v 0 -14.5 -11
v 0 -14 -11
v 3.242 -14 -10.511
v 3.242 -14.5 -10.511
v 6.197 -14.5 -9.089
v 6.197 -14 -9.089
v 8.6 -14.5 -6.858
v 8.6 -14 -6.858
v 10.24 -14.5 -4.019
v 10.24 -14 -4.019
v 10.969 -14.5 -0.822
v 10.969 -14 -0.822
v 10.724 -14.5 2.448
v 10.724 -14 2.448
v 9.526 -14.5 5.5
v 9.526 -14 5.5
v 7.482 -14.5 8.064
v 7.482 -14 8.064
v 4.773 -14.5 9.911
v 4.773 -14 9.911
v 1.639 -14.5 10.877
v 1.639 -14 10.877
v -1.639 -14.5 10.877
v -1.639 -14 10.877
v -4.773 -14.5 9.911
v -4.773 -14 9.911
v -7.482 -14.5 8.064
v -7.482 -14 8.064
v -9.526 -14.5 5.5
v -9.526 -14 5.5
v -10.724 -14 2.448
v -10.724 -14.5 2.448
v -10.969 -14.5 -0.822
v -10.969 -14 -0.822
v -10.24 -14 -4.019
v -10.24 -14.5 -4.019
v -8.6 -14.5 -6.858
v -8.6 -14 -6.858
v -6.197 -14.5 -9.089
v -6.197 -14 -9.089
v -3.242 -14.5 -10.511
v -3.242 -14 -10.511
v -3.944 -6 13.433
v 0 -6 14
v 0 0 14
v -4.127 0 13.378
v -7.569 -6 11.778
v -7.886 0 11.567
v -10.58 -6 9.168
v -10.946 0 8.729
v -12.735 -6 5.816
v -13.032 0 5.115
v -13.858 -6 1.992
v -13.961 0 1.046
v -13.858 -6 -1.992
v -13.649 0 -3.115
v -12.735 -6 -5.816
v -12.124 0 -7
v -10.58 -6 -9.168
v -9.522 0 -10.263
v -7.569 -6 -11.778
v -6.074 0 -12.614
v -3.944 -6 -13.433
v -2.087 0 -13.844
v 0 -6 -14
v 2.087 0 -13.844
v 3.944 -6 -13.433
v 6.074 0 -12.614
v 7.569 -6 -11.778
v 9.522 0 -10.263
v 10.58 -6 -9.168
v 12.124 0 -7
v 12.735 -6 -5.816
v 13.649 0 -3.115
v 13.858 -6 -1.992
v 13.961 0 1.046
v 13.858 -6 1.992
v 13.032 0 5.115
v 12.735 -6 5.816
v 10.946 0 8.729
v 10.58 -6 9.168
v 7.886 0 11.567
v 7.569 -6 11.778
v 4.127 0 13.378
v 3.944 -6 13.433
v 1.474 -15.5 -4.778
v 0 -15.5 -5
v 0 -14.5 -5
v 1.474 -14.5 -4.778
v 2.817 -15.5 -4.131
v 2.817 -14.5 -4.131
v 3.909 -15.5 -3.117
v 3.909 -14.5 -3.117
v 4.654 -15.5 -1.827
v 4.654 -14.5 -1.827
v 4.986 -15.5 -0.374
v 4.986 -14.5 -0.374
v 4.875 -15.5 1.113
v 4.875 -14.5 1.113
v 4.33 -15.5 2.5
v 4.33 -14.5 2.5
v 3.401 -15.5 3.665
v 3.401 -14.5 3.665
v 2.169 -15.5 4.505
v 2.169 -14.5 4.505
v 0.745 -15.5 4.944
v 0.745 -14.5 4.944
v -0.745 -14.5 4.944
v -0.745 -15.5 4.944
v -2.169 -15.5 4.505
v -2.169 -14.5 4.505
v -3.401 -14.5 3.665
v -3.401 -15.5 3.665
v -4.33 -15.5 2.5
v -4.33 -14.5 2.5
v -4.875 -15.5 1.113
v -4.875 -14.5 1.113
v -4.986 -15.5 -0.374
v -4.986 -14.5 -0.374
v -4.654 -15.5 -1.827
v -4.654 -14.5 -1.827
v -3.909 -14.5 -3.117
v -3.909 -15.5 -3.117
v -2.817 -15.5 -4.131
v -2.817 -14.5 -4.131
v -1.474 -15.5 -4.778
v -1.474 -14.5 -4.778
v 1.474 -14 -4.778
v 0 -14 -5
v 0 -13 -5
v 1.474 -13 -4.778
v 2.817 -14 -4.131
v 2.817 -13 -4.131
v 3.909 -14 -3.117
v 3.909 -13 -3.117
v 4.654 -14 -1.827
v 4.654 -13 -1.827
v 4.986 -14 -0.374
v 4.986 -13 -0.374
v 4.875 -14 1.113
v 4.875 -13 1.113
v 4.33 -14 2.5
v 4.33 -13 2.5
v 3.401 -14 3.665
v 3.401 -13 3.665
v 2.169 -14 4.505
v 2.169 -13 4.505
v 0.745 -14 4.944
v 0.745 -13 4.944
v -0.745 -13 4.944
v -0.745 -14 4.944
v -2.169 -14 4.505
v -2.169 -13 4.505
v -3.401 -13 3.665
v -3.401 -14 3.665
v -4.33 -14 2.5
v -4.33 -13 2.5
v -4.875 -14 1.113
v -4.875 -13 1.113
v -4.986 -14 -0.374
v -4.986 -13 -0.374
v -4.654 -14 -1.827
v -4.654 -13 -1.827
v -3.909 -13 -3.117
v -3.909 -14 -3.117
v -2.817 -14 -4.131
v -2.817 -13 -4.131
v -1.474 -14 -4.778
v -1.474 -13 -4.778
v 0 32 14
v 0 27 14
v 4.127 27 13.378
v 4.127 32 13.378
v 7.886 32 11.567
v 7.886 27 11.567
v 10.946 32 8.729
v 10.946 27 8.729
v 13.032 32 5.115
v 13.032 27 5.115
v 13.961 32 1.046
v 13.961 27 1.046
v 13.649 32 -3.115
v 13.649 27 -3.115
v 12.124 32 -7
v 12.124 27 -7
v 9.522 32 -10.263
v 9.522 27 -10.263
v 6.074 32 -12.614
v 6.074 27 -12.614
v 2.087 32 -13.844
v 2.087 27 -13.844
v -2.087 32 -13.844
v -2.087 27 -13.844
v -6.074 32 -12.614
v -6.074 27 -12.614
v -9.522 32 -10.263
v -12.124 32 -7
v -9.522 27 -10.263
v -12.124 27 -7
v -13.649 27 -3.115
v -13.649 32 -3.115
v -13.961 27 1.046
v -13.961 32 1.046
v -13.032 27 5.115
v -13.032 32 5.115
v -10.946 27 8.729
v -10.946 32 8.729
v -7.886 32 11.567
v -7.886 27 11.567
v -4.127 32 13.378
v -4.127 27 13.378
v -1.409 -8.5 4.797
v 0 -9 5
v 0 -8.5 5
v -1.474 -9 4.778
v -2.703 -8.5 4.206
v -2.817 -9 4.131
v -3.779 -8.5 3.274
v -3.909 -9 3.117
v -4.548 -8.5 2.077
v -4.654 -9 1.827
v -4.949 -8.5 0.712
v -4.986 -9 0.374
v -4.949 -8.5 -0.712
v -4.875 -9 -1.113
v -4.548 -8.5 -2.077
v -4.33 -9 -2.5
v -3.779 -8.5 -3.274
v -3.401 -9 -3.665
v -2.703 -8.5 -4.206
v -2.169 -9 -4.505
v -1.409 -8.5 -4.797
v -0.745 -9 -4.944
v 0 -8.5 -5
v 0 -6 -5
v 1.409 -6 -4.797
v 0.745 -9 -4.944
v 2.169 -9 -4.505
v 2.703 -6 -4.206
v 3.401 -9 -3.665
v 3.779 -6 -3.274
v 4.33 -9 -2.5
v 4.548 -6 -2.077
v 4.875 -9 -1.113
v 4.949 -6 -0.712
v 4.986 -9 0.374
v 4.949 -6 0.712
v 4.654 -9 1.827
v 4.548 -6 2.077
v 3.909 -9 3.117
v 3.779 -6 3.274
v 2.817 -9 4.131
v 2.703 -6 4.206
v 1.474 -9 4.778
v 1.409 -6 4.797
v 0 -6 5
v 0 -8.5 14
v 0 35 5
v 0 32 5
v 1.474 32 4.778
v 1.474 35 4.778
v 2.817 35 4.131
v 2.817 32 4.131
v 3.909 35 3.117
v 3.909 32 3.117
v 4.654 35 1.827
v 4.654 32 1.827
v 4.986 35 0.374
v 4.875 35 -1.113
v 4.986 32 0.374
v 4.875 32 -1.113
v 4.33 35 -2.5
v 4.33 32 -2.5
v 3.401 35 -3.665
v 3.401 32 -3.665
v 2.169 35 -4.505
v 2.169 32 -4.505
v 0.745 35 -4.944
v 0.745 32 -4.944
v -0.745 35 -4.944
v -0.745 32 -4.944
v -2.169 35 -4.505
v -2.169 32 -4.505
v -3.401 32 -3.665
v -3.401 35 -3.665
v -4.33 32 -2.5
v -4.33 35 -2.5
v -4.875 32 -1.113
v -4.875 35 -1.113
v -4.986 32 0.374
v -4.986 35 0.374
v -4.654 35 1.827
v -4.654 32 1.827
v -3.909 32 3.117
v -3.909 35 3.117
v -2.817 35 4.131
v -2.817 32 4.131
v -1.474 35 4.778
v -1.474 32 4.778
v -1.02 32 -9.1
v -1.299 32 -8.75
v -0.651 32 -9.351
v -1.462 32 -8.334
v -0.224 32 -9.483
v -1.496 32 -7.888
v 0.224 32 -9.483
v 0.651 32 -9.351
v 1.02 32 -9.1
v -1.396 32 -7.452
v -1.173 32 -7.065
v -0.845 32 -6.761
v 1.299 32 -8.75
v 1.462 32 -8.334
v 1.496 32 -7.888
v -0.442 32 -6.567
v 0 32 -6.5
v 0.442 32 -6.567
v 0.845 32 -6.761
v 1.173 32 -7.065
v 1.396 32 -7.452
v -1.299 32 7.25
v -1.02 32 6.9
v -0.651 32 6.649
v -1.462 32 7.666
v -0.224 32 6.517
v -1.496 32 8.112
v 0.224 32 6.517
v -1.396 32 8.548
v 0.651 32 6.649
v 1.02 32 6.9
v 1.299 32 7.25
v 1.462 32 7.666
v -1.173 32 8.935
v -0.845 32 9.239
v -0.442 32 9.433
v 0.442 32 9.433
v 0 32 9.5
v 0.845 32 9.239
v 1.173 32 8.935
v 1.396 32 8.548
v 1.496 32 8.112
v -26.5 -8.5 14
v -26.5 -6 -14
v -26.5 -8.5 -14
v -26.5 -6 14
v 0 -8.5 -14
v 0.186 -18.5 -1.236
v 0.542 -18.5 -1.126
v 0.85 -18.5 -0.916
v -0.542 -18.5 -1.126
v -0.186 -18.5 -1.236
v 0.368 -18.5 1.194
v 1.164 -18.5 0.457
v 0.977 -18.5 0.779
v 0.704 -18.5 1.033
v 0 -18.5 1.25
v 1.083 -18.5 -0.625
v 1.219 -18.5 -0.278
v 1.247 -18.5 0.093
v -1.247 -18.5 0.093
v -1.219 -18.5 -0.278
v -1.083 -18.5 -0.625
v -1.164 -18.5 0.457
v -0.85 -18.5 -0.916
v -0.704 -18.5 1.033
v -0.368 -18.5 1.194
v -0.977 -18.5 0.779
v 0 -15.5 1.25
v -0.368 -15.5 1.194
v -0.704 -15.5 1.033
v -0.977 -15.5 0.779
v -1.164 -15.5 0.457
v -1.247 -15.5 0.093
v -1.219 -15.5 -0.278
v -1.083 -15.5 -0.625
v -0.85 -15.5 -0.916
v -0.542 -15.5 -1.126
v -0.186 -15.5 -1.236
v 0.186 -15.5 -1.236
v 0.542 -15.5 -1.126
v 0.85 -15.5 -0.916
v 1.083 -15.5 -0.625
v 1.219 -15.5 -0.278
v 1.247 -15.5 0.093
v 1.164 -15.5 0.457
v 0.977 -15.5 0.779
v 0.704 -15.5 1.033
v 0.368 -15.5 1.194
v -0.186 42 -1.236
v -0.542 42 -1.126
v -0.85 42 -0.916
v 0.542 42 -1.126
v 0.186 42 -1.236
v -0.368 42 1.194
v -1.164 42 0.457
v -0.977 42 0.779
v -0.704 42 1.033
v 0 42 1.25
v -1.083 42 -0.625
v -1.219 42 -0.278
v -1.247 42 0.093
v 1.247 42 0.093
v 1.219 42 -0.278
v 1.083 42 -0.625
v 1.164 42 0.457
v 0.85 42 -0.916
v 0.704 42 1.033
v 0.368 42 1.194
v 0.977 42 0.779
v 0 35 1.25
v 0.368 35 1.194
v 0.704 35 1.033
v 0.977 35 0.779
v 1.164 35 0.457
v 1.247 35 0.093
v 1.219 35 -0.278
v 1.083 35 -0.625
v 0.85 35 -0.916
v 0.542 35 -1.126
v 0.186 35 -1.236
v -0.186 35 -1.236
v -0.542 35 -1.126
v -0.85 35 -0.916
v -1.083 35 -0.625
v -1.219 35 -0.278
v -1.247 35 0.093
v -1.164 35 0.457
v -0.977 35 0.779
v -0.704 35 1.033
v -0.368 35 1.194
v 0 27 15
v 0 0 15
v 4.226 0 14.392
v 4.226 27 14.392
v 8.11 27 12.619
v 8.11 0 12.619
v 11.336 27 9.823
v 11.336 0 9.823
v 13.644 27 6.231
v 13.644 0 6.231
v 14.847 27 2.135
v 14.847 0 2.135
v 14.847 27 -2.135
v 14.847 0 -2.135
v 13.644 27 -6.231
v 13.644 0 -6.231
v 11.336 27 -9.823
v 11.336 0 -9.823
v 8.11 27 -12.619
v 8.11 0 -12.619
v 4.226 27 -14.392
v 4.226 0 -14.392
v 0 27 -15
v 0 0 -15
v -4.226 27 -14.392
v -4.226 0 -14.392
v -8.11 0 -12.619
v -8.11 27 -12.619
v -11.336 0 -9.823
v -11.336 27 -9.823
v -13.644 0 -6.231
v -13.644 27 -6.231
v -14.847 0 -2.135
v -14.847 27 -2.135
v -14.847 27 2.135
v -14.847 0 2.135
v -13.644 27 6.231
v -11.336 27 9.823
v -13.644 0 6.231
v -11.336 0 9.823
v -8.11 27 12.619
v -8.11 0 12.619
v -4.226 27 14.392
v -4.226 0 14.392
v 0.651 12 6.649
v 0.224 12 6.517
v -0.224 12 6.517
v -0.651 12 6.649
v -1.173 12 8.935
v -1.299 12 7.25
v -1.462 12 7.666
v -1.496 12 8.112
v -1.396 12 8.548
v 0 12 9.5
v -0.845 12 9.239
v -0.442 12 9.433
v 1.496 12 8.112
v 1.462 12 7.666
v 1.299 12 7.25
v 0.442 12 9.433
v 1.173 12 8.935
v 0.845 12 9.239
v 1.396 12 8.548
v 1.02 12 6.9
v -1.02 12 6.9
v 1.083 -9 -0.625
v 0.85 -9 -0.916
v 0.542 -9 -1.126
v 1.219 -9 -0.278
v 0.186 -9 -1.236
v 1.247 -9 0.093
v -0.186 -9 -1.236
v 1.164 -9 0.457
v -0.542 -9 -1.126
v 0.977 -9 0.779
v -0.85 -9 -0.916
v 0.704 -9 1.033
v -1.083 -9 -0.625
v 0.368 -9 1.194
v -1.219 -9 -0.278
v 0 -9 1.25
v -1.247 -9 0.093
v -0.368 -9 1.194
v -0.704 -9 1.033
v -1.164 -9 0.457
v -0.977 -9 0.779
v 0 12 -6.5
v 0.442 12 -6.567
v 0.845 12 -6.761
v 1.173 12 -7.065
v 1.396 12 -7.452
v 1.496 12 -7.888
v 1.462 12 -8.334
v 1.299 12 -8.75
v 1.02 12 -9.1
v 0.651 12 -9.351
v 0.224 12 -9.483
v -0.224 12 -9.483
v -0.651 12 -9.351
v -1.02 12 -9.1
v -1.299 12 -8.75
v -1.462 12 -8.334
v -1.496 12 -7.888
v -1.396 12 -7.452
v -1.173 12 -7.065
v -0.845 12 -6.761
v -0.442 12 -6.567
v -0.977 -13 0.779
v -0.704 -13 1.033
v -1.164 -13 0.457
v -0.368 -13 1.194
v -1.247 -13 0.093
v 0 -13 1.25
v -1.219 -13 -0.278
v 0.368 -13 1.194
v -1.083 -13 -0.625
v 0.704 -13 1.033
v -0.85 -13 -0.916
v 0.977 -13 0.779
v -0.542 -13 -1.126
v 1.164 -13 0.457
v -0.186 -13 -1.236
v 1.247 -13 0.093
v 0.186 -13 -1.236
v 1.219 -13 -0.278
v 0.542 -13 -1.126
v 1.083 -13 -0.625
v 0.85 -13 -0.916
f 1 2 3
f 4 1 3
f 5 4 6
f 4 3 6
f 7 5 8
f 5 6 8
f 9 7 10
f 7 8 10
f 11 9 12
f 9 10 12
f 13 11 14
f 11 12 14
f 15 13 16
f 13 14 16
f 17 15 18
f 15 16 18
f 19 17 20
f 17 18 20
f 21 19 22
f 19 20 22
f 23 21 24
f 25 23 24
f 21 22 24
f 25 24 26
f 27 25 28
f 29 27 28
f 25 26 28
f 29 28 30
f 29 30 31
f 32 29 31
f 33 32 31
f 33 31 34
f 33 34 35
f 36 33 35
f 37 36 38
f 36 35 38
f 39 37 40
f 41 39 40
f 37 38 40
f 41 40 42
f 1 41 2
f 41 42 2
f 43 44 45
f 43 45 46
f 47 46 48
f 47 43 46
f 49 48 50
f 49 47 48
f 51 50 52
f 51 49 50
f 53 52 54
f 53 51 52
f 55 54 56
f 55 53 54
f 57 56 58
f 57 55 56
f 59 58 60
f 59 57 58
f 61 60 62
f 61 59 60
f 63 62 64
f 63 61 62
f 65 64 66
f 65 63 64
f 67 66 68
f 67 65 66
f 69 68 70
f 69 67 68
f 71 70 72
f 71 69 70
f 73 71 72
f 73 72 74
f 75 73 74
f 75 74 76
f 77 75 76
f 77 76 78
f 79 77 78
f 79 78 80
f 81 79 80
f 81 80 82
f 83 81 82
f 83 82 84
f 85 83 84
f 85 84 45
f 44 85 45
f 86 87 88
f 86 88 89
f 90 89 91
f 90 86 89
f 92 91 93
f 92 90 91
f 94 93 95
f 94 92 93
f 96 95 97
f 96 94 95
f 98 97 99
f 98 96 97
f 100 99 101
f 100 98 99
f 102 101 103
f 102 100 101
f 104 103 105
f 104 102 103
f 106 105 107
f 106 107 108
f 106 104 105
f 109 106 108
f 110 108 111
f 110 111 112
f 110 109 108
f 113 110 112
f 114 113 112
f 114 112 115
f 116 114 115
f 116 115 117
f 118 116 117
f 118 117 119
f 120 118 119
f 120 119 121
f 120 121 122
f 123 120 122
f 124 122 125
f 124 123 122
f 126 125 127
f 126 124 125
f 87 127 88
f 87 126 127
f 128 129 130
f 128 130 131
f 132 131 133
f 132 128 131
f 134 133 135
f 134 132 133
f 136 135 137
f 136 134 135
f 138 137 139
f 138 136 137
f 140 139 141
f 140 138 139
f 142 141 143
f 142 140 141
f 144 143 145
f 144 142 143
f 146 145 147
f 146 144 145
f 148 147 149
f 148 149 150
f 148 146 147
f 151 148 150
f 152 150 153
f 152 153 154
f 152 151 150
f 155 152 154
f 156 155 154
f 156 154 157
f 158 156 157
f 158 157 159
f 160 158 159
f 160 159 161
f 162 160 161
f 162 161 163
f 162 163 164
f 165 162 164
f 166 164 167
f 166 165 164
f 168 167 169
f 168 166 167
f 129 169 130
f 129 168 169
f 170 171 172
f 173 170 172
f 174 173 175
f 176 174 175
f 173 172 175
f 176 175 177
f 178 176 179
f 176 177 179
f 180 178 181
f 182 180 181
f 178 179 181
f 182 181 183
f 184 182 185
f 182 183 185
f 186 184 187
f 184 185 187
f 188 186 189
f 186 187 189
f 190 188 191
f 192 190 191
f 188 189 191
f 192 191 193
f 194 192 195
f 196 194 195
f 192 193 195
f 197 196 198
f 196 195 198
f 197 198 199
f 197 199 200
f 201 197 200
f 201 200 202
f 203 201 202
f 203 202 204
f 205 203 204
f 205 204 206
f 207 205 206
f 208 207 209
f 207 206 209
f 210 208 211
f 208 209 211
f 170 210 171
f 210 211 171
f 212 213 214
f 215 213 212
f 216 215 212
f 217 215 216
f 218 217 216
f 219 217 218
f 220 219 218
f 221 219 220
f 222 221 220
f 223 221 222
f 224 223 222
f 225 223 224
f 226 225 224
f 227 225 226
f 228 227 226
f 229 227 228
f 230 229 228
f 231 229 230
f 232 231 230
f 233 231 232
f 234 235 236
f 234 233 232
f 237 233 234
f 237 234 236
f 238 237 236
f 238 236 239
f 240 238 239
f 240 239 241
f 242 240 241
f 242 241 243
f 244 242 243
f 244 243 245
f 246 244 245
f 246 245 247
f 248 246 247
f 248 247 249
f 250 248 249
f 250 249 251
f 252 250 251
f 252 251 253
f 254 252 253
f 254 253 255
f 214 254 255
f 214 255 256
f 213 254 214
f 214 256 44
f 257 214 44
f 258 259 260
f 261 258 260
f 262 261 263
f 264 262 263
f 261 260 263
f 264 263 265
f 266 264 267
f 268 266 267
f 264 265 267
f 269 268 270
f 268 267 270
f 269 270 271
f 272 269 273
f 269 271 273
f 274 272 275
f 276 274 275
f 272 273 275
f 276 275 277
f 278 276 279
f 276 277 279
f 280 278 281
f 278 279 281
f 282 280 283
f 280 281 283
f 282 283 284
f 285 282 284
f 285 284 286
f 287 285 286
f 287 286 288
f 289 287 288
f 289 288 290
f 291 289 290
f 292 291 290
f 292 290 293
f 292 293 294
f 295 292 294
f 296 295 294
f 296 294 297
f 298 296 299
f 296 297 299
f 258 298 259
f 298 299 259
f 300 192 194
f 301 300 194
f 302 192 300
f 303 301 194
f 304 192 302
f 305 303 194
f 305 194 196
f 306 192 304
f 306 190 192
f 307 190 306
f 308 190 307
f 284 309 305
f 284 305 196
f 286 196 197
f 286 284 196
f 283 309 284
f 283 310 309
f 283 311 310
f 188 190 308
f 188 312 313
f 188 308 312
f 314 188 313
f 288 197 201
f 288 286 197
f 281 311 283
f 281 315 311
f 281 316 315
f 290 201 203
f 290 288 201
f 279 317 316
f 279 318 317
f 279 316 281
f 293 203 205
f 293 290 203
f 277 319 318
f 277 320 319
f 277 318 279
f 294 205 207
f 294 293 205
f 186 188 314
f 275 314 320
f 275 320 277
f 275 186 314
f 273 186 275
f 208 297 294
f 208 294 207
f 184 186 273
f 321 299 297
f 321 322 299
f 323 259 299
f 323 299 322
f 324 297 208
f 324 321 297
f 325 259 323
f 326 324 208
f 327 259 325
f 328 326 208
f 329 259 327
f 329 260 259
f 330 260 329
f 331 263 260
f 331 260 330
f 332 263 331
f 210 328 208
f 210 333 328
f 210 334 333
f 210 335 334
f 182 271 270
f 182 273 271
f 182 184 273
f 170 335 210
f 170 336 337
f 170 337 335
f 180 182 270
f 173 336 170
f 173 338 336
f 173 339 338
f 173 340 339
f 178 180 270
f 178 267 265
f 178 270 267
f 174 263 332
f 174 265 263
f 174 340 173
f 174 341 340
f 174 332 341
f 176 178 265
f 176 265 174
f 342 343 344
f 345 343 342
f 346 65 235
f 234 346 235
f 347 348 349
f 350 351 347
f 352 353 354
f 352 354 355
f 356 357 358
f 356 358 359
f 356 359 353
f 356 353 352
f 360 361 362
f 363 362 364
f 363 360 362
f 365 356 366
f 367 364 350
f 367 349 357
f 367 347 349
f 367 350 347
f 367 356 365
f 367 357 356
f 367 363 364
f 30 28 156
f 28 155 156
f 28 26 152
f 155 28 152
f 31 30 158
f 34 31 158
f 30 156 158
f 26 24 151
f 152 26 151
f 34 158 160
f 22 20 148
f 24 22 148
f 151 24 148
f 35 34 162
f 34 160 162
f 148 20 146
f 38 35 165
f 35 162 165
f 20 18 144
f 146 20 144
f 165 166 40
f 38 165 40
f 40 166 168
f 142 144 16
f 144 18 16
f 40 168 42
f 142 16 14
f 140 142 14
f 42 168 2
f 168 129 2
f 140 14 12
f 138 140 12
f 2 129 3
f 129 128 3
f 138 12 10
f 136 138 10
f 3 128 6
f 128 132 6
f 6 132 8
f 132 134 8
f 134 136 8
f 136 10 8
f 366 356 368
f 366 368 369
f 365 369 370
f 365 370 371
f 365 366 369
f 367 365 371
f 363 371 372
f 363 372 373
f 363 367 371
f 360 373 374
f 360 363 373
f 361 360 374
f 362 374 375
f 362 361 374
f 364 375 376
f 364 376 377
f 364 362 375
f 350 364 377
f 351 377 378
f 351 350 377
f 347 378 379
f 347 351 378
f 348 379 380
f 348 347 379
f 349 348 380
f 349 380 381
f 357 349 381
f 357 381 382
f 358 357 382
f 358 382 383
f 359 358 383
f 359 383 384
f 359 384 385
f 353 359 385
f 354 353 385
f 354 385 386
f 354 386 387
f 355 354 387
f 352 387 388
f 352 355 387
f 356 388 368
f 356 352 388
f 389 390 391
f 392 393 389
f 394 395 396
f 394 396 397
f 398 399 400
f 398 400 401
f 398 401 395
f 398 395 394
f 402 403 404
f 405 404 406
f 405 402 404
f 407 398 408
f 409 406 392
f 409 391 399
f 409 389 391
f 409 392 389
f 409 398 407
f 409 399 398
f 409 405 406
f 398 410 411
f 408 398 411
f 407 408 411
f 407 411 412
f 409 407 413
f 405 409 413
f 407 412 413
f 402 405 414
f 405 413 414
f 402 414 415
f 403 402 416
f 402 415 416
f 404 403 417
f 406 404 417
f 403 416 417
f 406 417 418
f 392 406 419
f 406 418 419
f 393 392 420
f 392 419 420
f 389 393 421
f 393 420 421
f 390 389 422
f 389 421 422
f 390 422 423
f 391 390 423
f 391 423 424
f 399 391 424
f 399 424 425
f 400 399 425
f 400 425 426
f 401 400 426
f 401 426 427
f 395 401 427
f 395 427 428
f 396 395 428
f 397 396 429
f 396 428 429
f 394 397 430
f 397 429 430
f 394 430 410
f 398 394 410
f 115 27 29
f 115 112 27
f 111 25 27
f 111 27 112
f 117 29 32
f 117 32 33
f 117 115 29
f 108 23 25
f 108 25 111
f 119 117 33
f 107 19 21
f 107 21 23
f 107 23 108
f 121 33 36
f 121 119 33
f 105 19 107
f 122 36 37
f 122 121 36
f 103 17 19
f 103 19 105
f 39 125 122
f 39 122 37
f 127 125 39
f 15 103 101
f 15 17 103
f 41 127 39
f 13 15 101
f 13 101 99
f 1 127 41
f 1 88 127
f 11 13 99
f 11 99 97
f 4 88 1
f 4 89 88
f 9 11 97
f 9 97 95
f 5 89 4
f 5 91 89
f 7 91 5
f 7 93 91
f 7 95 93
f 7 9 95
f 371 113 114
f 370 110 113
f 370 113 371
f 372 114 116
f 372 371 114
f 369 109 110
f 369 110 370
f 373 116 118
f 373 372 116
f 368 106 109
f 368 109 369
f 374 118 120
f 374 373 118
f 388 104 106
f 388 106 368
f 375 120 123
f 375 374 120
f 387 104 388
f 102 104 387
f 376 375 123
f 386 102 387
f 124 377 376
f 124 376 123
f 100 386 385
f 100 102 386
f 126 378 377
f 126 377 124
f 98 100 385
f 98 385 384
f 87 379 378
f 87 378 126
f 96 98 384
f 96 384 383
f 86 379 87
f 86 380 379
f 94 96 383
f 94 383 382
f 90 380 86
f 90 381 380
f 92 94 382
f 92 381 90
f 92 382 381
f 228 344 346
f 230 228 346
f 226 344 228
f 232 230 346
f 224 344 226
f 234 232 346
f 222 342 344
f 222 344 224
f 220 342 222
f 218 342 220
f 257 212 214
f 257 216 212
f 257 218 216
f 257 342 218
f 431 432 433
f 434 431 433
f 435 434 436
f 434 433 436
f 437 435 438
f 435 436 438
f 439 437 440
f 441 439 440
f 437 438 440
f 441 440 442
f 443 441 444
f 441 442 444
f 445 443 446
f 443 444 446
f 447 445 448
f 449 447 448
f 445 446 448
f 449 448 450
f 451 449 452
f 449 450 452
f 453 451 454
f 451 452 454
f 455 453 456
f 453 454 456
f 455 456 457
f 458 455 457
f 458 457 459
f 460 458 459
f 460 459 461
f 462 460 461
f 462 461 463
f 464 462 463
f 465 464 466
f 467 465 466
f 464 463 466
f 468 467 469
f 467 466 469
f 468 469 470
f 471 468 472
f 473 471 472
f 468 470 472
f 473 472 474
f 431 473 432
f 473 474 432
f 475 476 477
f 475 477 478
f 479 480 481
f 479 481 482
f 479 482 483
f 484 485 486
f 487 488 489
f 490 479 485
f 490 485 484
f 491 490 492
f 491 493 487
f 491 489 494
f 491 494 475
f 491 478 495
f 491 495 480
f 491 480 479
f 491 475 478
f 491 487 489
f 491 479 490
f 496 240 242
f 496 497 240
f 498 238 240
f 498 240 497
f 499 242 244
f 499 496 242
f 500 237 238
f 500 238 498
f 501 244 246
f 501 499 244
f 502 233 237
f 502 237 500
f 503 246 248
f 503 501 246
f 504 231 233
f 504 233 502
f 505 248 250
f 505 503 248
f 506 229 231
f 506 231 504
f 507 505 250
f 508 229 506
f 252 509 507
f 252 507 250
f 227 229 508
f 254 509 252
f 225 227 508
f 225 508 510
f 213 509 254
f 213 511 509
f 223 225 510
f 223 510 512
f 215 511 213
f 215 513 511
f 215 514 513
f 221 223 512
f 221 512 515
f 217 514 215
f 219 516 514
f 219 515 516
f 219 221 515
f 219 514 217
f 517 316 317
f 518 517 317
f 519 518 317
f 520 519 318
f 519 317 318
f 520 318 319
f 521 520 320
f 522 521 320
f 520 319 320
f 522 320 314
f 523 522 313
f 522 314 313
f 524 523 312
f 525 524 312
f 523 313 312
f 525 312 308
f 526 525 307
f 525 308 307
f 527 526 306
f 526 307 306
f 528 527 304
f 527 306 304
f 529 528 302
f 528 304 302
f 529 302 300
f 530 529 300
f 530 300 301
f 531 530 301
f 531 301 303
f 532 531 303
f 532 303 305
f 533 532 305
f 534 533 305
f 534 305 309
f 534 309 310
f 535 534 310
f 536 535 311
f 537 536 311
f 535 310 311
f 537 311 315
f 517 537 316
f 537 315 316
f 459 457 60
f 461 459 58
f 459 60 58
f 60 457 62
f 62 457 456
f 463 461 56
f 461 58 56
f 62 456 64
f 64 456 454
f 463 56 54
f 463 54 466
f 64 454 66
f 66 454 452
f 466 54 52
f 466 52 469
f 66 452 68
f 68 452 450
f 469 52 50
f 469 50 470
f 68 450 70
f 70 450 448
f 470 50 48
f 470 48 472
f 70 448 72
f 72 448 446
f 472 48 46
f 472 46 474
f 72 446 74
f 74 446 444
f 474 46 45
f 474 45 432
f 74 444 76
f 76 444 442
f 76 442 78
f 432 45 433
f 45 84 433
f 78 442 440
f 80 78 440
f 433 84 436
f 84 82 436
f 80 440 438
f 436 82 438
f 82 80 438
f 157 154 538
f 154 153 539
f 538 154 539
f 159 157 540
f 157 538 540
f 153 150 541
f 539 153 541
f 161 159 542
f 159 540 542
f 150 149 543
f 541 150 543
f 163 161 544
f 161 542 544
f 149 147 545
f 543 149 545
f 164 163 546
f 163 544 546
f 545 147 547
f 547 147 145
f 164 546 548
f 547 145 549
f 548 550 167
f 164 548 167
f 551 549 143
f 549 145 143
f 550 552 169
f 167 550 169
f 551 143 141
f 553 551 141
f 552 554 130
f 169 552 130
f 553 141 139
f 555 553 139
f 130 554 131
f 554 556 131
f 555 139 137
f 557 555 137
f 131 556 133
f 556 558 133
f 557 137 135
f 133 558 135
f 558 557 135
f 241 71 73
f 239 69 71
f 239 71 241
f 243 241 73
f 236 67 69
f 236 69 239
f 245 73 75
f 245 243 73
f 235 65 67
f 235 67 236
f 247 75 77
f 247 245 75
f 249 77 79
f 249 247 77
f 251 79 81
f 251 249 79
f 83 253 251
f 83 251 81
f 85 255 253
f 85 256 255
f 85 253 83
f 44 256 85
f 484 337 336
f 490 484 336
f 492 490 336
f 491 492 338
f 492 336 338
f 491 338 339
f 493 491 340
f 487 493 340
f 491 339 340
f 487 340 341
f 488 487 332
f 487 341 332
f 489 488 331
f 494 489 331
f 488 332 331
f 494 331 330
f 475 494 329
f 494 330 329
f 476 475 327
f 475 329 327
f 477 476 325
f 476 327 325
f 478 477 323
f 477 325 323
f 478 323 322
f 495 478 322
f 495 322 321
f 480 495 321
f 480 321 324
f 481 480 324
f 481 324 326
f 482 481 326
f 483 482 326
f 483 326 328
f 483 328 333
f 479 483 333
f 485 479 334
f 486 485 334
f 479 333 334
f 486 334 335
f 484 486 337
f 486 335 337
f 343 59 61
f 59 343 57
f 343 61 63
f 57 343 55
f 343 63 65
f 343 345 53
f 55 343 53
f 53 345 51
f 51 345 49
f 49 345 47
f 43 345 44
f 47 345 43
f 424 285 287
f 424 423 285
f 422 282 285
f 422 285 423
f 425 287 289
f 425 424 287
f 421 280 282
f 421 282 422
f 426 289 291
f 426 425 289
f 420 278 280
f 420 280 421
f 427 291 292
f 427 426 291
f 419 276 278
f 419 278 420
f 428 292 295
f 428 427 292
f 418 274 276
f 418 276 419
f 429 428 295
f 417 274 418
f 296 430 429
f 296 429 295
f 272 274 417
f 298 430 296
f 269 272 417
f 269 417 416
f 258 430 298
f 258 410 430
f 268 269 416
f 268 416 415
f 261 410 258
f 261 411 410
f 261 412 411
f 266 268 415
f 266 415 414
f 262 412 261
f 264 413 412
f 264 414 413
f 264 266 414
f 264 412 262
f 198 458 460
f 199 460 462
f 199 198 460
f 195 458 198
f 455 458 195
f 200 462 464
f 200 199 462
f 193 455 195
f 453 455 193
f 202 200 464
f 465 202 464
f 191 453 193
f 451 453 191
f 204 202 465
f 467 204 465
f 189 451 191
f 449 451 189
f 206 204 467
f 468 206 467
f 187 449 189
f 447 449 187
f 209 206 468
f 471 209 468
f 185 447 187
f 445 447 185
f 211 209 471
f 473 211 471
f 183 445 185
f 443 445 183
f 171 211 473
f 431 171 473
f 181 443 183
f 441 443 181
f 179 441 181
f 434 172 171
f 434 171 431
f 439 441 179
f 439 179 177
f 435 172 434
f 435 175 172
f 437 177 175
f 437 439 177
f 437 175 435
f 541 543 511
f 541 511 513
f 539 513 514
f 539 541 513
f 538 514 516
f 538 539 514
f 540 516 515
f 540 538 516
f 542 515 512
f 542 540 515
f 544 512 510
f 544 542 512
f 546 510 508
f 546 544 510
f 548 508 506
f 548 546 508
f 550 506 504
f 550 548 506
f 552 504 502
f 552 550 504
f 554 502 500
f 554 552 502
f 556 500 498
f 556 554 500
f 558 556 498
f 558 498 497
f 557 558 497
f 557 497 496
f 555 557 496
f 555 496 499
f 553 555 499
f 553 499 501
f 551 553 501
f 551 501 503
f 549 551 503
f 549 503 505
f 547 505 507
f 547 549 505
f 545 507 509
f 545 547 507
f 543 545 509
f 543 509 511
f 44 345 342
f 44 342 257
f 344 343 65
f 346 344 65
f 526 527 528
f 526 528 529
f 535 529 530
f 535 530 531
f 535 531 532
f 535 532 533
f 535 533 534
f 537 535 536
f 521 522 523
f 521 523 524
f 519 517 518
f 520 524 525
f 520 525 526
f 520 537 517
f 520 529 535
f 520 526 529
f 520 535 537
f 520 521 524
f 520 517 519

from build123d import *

# Parameters (mm, degrees)
SKETCH1_R            = 15
BOSS_EXTRUDE1_DEPTH  = 27
SKETCH2_R            = 14
BOSS_EXTRUDE2_DEPTH  = 5
SKETCH3_R            = 5
BOSS_EXTRUDE3_DEPTH  = 3
SKETCH4_R            = 1.25
BOSS_EXTRUDE4_DEPTH  = 7
BOSS_EXTRUDE5_START  = 6
SKETCH5_R            = 14
BOSS_EXTRUDE5_DEPTH  = 6
BOSS_EXTRUDE6_START  = 3
SKETCH6_R            = 5
BOSS_EXTRUDE6_DEPTH  = 3
SKETCH7_W            = 26.5
SKETCH7_H            = 28
BOSS_EXTRUDE7_DEPTH  = 2.5
BOSS_EXTRUDE8_START  = 4
SKETCH8_R            = 1.25
BOSS_EXTRUDE8_DEPTH  = 4
BOSS_EXTRUDE9_START  = 1
SKETCH9_R            = 5
BOSS_EXTRUDE9_DEPTH  = 1
SKETCH10_R           = 11
BOSS_EXTRUDE10_DEPTH = 0.5
BOSS_EXTRUDE11_START = 1
SKETCH11_R           = 5
BOSS_EXTRUDE11_DEPTH = 1
BOSS_EXTRUDE12_START = 3
SKETCH12_R           = 1.25
BOSS_EXTRUDE12_DEPTH = 3
SKETCH13_R           = 1.5
CUT_EXTRUDE1_DEPTH   = 20


with BuildPart() as part:
    # Sketch1 → Boss-Extrude1 (new body)
    with BuildSketch(Plane(origin=(0, 0, 0), x_dir=(1, 0, 0), z_dir=(0, 1, 0))):
        with Locations(Location((0, 0, 0), (0, 0, 270))):
            Circle(SKETCH1_R)
    extrude(amount=BOSS_EXTRUDE1_DEPTH)

    # Sketch2 → Boss-Extrude2 (add)
    with BuildSketch(Plane(origin=(0, 27, 0), x_dir=(1, 0, 0), z_dir=(0, 1, 0))):
        with Locations(Location((0, 0, 0), (0, 0, 270))):
            Circle(SKETCH2_R)
    extrude(amount=BOSS_EXTRUDE2_DEPTH)

    # Sketch3 → Boss-Extrude3 (add)
    with BuildSketch(Plane(origin=(0, 32, 0), x_dir=(1, 0, 0), z_dir=(0, 1, 0))):
        with Locations(Location((0, 0, 0), (0, 0, 270))):
            Circle(SKETCH3_R)
    extrude(amount=BOSS_EXTRUDE3_DEPTH)

    # Sketch4 → Boss-Extrude4 (add)
    with BuildSketch(Plane(origin=(0, 35, 0), x_dir=(1, 0, 0), z_dir=(0, 1, 0))):
        with Locations(Location((0, 0, 0), (0, 0, 270))):
            Circle(SKETCH4_R)
    extrude(amount=BOSS_EXTRUDE4_DEPTH)

    # Sketch5 → Boss-Extrude5 (add)
    with BuildSketch(Plane.XZ.offset(BOSS_EXTRUDE5_START)):
        with Locations(Location((0, 0, 0), (0, 0, 90))):
            Circle(SKETCH5_R)
    extrude(amount=-BOSS_EXTRUDE5_DEPTH)

    # Sketch6 → Boss-Extrude6 (add)
    with BuildSketch(Plane.XZ.offset(6).offset(BOSS_EXTRUDE6_START)):
        with Locations(Location((0, 0, 0), (0, 0, 90))):
            Circle(SKETCH6_R)
    extrude(amount=-BOSS_EXTRUDE6_DEPTH)

    # Sketch7 → Boss-Extrude7 (add)
    with BuildSketch(Plane.XZ.offset(6)):
        with Locations((-13.25, 0)):
            Rectangle(SKETCH7_W, SKETCH7_H)
    extrude(amount=BOSS_EXTRUDE7_DEPTH)

    # Sketch8 → Boss-Extrude8 (add)
    with BuildSketch(Plane.XZ.offset(9).offset(BOSS_EXTRUDE8_START)):
        with Locations(Location((0, 0, 0), (0, 0, 90))):
            Circle(SKETCH8_R)
    extrude(amount=-BOSS_EXTRUDE8_DEPTH)

    # Sketch9 → Boss-Extrude9 (add)
    with BuildSketch(Plane.XZ.offset(13).offset(BOSS_EXTRUDE9_START)):
        with Locations(Location((0, 0, 0), (0, 0, 270))):
            Circle(SKETCH9_R)
    extrude(amount=-BOSS_EXTRUDE9_DEPTH)

    # Sketch10 → Boss-Extrude10 (add)
    with BuildSketch(Plane.XZ.offset(14)):
        with Locations(Location((0, 0, 0), (0, 0, 270))):
            Circle(SKETCH10_R)
    extrude(amount=BOSS_EXTRUDE10_DEPTH)

    # Sketch11 → Boss-Extrude11 (add)
    with BuildSketch(Plane.XZ.offset(14.5).offset(BOSS_EXTRUDE11_START)):
        with Locations(Location((0, 0, 0), (0, 0, 270))):
            Circle(SKETCH11_R)
    extrude(amount=-BOSS_EXTRUDE11_DEPTH)

    # Sketch12 → Boss-Extrude12 (add)
    with BuildSketch(Plane.XZ.offset(15.5).offset(BOSS_EXTRUDE12_START)):
        with Locations(Location((0, 0, 0), (0, 0, 90))):
            Circle(SKETCH12_R)
    extrude(amount=-BOSS_EXTRUDE12_DEPTH)

    # Sketch13 → Cut-Extrude1 (cut)
    with BuildSketch(Plane(origin=(0, 32, 0), x_dir=(1, 0, 0), z_dir=(0, 1, 0))):
        with Locations(Location((0, 8, 0), (0, 0, 270))):
            Circle(SKETCH13_R)
        with Locations(Location((0, -8, 0), (0, 0, 270))):
            Circle(SKETCH13_R)
    extrude(amount=-CUT_EXTRUDE1_DEPTH, mode=Mode.SUBTRACT)


solid = part.part
